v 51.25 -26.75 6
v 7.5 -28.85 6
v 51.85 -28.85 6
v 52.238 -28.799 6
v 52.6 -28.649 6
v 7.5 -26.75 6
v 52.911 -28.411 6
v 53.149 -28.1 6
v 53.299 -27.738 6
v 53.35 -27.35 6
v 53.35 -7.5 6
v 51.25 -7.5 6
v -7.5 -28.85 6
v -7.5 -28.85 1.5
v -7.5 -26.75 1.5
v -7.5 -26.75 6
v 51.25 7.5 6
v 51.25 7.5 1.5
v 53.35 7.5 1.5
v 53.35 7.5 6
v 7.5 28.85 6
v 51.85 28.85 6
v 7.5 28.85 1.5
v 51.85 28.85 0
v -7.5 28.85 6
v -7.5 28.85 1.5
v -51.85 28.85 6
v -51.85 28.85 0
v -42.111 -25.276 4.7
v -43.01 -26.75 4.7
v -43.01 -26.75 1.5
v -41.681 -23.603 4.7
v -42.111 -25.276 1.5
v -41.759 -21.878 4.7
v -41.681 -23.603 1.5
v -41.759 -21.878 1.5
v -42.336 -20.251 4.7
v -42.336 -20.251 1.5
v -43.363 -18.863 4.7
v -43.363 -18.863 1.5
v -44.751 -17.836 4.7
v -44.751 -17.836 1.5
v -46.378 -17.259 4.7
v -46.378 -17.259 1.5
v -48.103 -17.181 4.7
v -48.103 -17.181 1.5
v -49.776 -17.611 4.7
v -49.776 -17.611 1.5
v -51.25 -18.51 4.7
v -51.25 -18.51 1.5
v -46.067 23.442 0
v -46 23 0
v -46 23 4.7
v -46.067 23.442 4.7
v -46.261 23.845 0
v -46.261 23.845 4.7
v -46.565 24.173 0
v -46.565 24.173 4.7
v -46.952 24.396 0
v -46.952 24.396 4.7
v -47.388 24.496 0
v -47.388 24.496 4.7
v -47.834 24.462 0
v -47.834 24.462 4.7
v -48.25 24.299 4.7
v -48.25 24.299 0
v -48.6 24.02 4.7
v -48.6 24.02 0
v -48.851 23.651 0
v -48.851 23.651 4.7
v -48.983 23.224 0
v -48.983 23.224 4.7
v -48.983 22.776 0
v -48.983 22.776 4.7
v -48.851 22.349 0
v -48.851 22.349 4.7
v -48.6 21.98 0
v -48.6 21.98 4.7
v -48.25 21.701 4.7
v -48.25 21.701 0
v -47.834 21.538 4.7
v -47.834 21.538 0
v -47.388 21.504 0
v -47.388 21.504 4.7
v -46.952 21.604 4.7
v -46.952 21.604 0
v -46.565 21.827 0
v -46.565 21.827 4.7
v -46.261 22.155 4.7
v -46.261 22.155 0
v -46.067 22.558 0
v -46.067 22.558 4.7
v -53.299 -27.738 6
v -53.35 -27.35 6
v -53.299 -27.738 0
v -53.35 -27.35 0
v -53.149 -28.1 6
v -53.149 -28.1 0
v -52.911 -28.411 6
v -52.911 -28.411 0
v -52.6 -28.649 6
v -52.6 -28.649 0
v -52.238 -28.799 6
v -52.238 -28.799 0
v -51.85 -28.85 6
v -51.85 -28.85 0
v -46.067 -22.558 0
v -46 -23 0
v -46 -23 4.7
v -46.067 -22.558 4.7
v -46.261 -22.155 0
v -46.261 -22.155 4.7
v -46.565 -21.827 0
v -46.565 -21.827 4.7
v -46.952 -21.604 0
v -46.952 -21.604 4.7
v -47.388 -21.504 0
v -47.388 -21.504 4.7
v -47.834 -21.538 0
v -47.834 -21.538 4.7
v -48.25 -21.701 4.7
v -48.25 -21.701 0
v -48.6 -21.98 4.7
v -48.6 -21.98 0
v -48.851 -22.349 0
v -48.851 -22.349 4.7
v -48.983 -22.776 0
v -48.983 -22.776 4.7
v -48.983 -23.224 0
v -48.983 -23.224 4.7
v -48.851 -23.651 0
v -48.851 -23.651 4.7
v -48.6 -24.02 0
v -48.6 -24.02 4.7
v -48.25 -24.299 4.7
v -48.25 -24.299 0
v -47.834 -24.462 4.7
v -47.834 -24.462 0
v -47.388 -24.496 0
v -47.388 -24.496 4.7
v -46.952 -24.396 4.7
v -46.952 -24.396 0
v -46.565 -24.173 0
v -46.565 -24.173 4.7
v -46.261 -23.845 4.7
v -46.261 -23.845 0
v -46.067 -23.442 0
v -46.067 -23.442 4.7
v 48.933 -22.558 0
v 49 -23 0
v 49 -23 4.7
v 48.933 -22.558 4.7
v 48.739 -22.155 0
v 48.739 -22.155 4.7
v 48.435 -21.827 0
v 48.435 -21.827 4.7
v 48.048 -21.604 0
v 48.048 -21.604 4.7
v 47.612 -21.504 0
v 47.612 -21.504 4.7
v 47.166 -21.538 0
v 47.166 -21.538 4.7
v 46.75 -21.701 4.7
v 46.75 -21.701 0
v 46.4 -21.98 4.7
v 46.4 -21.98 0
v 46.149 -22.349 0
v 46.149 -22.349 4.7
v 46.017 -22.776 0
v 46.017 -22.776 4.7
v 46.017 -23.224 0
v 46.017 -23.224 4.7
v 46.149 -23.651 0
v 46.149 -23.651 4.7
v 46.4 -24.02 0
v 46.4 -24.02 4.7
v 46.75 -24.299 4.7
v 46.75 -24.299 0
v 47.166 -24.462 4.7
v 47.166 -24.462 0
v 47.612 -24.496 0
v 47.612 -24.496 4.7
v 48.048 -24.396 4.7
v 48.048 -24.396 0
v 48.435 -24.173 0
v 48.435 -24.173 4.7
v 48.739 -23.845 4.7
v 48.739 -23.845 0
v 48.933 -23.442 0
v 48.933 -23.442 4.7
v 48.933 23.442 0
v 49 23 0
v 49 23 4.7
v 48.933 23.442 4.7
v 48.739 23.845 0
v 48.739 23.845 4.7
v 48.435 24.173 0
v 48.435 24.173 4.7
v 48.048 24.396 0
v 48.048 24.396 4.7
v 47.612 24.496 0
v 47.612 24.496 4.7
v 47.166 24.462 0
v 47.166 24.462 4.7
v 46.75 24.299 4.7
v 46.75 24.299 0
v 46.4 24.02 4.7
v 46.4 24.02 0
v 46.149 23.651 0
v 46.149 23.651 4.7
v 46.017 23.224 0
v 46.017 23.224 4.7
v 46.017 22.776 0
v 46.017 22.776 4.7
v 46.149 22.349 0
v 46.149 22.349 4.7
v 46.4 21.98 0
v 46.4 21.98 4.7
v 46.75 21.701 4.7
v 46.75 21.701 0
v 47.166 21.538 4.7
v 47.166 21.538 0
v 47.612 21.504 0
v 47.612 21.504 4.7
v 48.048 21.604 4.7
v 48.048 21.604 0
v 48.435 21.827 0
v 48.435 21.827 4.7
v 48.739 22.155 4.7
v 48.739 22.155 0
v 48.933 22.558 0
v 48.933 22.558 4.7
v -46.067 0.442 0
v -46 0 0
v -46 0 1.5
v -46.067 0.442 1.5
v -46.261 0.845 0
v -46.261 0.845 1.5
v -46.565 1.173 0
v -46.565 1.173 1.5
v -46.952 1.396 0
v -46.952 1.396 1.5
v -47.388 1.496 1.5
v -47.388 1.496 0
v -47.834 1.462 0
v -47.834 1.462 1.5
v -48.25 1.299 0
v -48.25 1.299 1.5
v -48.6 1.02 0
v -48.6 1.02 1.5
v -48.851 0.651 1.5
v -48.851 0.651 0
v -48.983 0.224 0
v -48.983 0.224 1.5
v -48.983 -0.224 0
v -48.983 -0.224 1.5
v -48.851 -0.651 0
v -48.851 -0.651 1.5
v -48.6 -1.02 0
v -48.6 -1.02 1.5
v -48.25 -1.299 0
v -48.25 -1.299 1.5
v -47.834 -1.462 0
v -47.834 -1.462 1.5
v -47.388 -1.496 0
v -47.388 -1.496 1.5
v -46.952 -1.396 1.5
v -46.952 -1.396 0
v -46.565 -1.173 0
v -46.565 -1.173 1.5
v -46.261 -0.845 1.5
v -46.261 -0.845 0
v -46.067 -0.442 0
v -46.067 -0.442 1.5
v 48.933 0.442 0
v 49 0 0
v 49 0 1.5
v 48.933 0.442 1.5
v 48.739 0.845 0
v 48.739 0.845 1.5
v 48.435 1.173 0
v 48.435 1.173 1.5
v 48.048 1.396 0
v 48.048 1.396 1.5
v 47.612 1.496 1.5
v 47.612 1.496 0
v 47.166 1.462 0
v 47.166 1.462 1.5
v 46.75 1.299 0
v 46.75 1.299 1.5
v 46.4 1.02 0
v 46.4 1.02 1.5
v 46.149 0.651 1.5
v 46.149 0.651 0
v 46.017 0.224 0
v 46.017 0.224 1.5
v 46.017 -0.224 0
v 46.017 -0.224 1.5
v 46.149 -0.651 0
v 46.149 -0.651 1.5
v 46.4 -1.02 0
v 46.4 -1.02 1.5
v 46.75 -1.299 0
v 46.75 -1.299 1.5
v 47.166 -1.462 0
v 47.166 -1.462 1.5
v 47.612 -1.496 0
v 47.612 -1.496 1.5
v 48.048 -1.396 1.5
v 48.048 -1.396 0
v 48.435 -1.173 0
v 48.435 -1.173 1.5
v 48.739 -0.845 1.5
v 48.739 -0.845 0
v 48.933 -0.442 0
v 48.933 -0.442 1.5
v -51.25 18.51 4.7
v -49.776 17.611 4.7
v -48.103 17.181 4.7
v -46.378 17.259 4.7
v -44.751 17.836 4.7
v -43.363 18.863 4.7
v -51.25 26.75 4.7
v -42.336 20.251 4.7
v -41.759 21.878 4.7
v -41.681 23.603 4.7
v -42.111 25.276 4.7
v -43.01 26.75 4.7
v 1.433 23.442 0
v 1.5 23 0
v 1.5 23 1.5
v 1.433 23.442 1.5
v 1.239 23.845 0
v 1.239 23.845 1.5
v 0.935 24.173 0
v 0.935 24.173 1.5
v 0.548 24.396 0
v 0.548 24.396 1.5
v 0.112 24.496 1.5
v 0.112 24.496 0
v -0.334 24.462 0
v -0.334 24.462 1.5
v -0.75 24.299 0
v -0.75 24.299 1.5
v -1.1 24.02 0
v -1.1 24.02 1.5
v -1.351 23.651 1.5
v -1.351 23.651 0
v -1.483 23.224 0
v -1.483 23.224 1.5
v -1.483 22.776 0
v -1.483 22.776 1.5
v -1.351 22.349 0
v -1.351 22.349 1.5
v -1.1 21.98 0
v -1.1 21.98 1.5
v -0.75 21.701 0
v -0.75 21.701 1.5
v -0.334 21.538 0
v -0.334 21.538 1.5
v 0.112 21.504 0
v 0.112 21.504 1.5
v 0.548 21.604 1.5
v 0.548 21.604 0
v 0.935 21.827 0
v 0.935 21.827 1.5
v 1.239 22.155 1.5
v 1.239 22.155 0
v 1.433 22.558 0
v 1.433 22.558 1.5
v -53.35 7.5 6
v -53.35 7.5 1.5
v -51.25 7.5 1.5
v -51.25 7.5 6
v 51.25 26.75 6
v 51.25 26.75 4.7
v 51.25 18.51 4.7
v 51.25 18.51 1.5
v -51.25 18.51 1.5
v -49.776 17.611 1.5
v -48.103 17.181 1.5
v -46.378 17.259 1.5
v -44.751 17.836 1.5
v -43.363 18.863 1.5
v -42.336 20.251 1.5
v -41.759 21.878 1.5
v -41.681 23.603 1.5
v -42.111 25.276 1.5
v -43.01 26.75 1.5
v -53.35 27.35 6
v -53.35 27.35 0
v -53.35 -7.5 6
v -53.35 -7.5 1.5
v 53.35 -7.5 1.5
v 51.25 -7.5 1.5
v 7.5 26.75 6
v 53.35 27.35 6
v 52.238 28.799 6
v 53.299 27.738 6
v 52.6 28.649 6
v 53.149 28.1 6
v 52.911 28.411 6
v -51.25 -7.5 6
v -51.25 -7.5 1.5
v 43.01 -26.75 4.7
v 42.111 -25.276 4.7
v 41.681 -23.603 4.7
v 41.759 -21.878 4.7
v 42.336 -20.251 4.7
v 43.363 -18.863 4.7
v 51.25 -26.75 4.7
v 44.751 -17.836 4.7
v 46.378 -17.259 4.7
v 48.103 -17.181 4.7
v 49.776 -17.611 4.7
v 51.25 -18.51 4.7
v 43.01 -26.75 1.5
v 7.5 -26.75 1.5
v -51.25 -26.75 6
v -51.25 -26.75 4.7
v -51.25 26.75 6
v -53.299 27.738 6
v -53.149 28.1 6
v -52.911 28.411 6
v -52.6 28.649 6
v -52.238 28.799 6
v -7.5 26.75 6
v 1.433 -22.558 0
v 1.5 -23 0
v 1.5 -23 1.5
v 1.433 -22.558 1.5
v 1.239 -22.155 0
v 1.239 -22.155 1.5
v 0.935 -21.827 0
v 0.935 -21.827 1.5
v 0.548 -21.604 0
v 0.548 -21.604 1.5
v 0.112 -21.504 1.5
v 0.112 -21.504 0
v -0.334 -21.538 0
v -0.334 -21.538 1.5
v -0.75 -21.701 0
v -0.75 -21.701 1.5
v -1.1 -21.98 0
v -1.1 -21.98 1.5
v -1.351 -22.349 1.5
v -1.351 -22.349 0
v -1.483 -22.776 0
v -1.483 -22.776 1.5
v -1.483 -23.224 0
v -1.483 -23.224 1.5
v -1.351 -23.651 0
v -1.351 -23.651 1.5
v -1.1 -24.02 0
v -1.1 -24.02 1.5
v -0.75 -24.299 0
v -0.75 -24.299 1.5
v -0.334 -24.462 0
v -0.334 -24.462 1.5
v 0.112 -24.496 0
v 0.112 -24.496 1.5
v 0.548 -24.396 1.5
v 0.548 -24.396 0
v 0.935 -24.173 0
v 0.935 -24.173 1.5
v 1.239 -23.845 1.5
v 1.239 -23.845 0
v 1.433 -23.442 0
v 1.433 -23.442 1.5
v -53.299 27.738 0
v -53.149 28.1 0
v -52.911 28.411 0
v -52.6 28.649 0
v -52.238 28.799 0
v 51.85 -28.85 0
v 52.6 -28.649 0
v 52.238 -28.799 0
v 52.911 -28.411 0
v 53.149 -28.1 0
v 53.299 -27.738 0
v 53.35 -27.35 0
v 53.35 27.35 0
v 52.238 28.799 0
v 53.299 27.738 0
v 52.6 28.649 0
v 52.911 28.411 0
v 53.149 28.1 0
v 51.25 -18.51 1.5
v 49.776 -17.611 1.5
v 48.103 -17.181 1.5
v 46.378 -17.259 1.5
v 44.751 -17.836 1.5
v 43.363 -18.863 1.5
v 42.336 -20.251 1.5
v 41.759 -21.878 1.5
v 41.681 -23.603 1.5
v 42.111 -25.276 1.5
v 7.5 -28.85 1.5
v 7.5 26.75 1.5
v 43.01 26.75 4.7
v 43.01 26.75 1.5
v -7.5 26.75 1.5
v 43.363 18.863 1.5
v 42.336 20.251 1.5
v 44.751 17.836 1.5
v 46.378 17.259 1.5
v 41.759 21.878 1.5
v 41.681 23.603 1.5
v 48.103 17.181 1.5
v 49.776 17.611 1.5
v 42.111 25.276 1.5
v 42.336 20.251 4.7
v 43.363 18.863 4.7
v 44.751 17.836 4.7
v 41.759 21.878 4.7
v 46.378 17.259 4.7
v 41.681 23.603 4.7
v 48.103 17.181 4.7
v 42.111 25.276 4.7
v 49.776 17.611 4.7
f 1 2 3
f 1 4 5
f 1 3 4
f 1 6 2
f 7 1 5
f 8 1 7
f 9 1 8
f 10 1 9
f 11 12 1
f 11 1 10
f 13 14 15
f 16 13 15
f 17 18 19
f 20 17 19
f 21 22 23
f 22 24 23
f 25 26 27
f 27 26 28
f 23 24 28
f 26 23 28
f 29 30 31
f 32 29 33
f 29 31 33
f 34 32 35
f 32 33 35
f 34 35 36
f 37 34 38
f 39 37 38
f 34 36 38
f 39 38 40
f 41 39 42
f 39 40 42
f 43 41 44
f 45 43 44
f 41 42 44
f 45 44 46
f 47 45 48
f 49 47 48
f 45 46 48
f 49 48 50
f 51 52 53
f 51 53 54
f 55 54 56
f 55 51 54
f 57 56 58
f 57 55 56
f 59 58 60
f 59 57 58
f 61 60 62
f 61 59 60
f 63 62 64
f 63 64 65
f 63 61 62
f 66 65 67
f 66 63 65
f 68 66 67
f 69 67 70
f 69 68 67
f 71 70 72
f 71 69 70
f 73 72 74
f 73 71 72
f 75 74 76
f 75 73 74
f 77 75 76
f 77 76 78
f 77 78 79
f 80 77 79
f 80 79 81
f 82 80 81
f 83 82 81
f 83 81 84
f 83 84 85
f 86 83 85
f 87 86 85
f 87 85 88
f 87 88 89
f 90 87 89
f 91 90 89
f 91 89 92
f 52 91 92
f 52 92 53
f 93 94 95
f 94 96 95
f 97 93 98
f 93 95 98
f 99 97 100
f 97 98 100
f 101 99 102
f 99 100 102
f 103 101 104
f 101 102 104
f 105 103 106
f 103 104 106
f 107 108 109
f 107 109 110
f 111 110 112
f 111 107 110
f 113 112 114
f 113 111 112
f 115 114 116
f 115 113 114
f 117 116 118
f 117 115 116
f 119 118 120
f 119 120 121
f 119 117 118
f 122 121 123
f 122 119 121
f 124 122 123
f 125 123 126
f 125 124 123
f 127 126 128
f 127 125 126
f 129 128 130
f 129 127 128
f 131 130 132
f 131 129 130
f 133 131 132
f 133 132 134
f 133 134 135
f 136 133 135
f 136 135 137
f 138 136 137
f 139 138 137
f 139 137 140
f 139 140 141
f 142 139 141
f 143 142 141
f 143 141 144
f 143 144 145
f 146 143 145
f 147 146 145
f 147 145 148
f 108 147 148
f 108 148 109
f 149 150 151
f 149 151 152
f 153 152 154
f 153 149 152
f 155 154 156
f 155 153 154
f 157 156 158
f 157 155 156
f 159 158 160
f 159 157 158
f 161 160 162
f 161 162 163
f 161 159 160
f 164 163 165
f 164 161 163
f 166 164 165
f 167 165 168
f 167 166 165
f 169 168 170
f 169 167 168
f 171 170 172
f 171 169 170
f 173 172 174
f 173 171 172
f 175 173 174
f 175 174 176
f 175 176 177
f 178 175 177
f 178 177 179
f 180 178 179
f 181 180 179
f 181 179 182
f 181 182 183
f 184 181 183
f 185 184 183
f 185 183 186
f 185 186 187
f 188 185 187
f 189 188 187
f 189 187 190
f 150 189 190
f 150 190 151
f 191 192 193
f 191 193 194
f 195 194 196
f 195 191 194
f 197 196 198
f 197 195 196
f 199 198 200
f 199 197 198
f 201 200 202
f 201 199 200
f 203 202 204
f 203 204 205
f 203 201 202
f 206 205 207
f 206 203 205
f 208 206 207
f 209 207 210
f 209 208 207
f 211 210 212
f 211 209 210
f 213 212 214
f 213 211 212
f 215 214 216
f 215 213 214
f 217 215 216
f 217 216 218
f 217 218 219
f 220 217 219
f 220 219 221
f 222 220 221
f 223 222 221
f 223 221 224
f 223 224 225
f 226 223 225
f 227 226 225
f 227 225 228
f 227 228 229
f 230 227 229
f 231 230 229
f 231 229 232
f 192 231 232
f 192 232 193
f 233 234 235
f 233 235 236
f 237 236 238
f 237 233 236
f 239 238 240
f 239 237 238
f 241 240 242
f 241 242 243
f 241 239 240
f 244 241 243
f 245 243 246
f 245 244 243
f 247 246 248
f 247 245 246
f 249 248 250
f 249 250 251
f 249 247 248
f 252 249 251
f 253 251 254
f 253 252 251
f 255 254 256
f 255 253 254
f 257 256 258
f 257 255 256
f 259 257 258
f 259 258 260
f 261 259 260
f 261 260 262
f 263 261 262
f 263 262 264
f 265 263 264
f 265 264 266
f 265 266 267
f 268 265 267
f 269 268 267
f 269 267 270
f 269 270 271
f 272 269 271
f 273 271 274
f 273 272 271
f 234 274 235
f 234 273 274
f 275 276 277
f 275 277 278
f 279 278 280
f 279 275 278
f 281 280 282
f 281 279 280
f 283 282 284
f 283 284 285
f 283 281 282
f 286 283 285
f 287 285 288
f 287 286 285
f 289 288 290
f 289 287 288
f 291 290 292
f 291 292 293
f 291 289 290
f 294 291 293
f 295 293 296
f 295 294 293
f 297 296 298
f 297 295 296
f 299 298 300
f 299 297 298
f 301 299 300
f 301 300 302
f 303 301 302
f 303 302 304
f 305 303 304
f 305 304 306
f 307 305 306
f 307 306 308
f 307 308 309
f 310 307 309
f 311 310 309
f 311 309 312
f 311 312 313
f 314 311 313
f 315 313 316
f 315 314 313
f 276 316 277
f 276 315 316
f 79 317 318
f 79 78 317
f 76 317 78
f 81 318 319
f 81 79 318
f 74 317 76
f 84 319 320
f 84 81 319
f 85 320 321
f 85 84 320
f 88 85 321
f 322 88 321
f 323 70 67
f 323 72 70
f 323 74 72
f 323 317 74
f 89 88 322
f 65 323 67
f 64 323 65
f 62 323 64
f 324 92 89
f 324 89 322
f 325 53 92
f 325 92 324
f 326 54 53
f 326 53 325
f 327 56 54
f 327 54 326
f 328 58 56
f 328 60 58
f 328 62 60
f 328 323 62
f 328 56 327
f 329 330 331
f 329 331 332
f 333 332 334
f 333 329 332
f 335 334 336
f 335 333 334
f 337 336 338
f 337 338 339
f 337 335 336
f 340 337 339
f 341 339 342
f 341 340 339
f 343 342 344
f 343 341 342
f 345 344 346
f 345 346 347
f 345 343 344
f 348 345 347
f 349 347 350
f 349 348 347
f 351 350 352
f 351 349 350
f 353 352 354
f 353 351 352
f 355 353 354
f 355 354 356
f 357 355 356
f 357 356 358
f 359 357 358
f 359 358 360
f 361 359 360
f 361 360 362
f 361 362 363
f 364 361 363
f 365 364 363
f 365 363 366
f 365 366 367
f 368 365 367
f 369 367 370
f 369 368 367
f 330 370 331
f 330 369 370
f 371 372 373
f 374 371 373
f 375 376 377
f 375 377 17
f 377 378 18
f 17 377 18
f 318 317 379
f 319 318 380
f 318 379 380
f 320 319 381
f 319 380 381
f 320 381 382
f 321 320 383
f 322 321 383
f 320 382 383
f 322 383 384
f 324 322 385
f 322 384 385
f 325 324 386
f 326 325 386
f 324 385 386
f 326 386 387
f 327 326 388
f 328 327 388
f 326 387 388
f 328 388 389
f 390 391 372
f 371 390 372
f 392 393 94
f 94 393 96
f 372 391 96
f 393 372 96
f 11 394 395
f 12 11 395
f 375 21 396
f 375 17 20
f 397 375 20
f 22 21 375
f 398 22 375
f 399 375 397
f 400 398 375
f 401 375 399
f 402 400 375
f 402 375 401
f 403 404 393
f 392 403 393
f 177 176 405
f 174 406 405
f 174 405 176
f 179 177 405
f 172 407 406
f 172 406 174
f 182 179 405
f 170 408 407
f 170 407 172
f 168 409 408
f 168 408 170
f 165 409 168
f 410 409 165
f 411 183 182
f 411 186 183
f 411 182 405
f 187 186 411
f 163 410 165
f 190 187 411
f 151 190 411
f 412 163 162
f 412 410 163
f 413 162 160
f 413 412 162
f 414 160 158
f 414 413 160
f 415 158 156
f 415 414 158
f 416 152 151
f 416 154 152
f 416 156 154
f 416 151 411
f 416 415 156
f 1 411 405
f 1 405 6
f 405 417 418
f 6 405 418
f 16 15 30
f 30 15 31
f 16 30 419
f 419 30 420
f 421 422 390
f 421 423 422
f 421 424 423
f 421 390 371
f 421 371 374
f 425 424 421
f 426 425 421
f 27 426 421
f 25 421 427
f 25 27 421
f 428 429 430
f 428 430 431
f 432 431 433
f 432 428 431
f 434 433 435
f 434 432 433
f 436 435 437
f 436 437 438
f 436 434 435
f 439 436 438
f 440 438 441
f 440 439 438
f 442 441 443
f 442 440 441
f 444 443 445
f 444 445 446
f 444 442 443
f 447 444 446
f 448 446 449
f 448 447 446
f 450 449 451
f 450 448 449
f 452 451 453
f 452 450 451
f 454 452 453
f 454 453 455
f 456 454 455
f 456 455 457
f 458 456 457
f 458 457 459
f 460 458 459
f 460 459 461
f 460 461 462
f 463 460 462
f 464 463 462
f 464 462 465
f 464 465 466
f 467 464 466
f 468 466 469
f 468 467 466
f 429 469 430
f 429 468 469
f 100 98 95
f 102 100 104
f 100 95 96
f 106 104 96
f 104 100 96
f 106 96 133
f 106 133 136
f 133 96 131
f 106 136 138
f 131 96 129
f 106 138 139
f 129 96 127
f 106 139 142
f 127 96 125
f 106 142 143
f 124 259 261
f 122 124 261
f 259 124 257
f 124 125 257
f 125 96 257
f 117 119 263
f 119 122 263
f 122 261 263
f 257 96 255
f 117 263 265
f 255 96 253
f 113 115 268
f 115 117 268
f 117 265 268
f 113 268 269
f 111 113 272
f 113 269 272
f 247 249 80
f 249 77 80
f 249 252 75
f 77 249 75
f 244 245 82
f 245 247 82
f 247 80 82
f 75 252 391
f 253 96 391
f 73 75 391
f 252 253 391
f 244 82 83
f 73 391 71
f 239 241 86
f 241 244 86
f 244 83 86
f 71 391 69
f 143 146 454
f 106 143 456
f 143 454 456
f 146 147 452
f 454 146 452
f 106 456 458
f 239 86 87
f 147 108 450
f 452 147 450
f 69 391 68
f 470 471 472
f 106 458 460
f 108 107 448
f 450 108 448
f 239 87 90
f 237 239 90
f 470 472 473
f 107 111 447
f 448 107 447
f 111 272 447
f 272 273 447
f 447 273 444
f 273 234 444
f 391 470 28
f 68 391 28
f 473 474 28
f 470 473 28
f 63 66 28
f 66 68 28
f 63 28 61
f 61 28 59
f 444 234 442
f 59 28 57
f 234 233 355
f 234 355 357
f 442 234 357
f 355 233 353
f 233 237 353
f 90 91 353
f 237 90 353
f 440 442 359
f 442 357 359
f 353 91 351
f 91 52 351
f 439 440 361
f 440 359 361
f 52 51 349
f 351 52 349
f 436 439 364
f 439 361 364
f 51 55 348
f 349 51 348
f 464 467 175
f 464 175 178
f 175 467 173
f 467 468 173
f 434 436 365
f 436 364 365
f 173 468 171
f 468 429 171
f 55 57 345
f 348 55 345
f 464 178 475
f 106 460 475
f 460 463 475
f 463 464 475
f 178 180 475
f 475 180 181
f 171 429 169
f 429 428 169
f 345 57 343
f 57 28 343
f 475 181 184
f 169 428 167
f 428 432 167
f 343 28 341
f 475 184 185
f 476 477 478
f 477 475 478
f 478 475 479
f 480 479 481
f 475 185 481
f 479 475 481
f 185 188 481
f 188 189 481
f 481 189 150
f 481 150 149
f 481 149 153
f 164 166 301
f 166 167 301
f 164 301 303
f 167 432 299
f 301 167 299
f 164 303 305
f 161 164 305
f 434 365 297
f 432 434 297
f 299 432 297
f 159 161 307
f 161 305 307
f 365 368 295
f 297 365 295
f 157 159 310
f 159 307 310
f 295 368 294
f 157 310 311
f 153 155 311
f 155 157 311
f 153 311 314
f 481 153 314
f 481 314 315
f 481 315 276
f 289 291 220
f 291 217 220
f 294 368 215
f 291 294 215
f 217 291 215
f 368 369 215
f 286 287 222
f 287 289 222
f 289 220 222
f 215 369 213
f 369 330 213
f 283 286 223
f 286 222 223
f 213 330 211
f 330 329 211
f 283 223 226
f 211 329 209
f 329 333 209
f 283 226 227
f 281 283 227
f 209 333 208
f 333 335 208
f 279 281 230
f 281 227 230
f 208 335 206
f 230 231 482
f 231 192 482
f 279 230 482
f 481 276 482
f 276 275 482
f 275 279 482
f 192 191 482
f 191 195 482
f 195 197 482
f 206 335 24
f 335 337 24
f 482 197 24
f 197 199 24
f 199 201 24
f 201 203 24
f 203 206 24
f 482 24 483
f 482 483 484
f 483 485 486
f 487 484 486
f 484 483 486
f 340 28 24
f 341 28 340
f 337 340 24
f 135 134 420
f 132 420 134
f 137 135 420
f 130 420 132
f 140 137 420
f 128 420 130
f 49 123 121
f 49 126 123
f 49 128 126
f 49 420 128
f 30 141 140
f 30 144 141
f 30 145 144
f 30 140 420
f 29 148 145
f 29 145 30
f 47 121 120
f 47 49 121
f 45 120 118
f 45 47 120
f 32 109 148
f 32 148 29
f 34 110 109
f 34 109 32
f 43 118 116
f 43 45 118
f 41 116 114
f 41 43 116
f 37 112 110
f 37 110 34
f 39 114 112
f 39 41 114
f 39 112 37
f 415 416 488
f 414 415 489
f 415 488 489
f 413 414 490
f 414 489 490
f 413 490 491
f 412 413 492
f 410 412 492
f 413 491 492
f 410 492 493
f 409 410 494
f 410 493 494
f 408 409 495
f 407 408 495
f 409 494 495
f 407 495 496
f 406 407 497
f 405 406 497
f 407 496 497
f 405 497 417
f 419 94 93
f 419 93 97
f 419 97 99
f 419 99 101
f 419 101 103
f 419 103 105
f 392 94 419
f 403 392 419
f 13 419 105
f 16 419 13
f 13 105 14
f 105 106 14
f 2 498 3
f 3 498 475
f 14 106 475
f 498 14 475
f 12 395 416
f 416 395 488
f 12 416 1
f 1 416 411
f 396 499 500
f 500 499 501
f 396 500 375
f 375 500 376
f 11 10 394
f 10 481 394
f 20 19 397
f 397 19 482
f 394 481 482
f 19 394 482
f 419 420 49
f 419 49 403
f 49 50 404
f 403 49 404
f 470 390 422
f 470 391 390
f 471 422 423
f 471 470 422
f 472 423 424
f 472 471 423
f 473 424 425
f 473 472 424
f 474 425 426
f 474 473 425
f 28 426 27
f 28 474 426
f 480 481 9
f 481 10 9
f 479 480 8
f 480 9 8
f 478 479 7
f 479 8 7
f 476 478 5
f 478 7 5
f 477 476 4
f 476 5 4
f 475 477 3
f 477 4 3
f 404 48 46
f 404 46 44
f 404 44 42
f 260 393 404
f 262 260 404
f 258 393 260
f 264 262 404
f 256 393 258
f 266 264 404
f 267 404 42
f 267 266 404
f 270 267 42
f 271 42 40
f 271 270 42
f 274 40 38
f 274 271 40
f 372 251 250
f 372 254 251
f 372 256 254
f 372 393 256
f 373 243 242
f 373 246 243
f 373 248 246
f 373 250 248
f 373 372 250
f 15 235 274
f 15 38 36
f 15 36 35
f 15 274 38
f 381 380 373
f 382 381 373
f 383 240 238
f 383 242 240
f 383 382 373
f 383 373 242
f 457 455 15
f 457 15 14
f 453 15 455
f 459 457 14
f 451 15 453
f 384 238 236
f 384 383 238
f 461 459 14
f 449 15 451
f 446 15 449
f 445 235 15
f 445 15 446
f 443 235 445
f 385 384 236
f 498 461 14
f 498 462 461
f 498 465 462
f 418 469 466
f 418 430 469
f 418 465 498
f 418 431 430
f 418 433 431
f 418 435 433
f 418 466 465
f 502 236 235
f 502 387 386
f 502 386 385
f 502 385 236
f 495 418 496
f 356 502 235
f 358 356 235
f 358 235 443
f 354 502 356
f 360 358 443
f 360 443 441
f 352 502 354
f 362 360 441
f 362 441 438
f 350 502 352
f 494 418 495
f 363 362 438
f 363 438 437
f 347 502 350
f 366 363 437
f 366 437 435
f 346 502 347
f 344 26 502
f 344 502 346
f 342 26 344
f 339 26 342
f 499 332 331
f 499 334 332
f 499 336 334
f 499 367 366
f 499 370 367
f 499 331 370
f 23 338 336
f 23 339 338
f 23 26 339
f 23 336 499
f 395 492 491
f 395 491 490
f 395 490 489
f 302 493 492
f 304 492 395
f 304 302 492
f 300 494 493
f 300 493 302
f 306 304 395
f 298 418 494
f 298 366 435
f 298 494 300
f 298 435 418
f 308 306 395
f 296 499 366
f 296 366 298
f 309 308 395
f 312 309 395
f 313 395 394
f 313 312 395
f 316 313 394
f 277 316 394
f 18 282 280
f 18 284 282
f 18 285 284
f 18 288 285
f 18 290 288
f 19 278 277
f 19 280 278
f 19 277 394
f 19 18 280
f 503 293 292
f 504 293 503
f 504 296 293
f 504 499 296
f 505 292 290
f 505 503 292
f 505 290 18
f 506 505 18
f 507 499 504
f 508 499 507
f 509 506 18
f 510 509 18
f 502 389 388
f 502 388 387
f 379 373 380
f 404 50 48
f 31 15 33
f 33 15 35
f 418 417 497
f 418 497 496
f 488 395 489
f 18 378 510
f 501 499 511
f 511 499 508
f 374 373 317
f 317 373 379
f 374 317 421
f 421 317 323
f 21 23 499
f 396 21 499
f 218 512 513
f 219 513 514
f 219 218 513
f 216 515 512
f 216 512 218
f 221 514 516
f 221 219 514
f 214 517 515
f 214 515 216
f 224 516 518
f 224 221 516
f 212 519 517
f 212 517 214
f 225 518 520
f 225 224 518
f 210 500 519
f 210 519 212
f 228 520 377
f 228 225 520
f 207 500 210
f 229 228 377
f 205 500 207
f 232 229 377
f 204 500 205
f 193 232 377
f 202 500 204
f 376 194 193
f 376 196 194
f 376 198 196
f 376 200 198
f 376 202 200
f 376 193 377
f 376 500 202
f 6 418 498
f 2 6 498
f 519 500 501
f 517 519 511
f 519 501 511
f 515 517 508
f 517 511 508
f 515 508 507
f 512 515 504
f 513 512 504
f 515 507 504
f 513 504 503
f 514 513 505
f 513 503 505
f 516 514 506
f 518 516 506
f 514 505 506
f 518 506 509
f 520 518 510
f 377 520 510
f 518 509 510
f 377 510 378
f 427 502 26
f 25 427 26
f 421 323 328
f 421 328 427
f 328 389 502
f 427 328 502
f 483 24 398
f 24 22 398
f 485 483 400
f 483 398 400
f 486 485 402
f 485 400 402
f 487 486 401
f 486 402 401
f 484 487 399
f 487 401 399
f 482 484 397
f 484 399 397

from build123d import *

# Parameters (mm, degrees)
F2_W     = 2.1
F2_H     = 15
F2_W_2   = 15
F2_H_2   = 2.1
F2_R     = 1.5
F2_W_3   = 43.75
F2_H_3   = 19.25
F3_DEPTH = 1.5
F4_DEPTH = 4.7
F5_DEPTH = 6
F6_R     = 1.5


with BuildPart() as f3:
    # F2 (on Top) → F3 (new body)
    with BuildSketch(Plane.XY):
        Polygon((-51.25, 18.5100111359), (-51.25, 26.75), (-43.0100111359, 26.75), (-7.5, 26.75), (-7.5, 28.85), (-53.35, 28.85), (-53.35, 7.5), (-51.25, 7.5), align=None)
        with Locations((-52.3, 0)):
            Rectangle(F2_W, F2_H)
        with Locations((52.3, 0)):
            Rectangle(F2_W, F2_H)
        Polygon((7.5, 28.85), (7.5, 26.75), (43.0100111359, 26.75), (51.25, 26.75), (51.25, 18.5100111359), (51.25, 7.5), (53.35, 7.5), (53.35, 28.85), align=None)
        Polygon((-51.25, -18.5100111359), (-51.25, -7.5), (-53.35, -7.5), (-53.35, -28.85), (-7.5, -28.85), (-7.5, -26.75), (-43.0100111359, -26.75), (-51.25, -26.75), align=None)
        with Locations((0, -27.8)):
            Rectangle(F2_W_2, F2_H_2)
        with Locations((0, 27.8)):
            Rectangle(F2_W_2, F2_H_2)
        Polygon((53.35, -7.5), (51.25, -7.5), (51.25, -18.5100111359), (51.25, -26.75), (43.0100111359, -26.75), (7.5, -26.75), (7.5, -28.85), (53.35, -28.85), align=None)
        with BuildLine():
            Line((-7.5, -7.5), (-51.25, -7.5))
            Line((-51.25, -7.5), (-51.25, -18.5100111359))
            ThreePointArc((-51.25, -18.5100111359), (-43.3634253301, -18.8634253301), (-43.0100111359, -26.75))
            Line((-43.0100111359, -26.75), (-7.5, -26.75))
            Line((-7.5, -26.75), (-7.5, -7.5))
        make_face()
        with BuildLine():
            Line((-43.0100111359, 26.75), (-51.25, 26.75))
            Line((-51.25, 26.75), (-51.25, 18.5100111359))
            ThreePointArc((-51.25, 18.5100111359), (-43.3634253301, 18.8634253301), (-43.0100111359, 26.75))
        make_face()
        with Locations((-47.5, 23)):
            Circle(F2_R, mode=Mode.SUBTRACT)
        with BuildLine():
            Line((51.25, 26.75), (43.0100111359, 26.75))
            ThreePointArc((43.0100111359, 26.75), (43.3634253301, 18.8634253301), (51.25, 18.5100111359))
            Line((51.25, 18.5100111359), (51.25, 26.75))
        make_face()
        with Locations((47.5, 23)):
            Circle(F2_R, mode=Mode.SUBTRACT)
        with BuildLine():
            Line((51.25, -26.75), (51.25, -18.5100111359))
            ThreePointArc((51.25, -18.5100111359), (43.3634253301, -18.8634253301), (43.0100111359, -26.75))
            Line((43.0100111359, -26.75), (51.25, -26.75))
        make_face()
        with Locations((47.5, -23)):
            Circle(F2_R, mode=Mode.SUBTRACT)
        with BuildLine():
            ThreePointArc((-43.0100111359, -26.75), (-43.3634253301, -18.8634253301), (-51.25, -18.5100111359))
            Line((-51.25, -18.5100111359), (-51.25, -26.75))
            Line((-51.25, -26.75), (-43.0100111359, -26.75))
        make_face()
        with Locations((-47.5, -23)):
            Circle(F2_R, mode=Mode.SUBTRACT)
        with Locations((-29.375, 0)):
            Rectangle(F2_W_3, F2_H)
        with Locations((-47.5, 0)):
            Circle(F2_R, mode=Mode.SUBTRACT)
        with BuildLine():
            Line((-7.5, 26.75), (-43.0100111359, 26.75))
            ThreePointArc((-43.0100111359, 26.75), (-43.3634253301, 18.8634253301), (-51.25, 18.5100111359))
            Line((-51.25, 18.5100111359), (-51.25, 7.5))
            Line((-51.25, 7.5), (-7.5, 7.5))
            Line((-7.5, 7.5), (-7.5, 26.75))
        make_face()
        with Locations((0, 17.125)):
            Rectangle(F2_W_2, F2_H_3)
        with Locations((0, 23)):
            Circle(F2_R, mode=Mode.SUBTRACT)
        with BuildLine():
            Line((43.0100111359, 26.75), (7.5, 26.75))
            Line((7.5, 26.75), (7.5, 7.5))
            Line((7.5, 7.5), (51.25, 7.5))
            Line((51.25, 7.5), (51.25, 18.5100111359))
            ThreePointArc((51.25, 18.5100111359), (43.3634253301, 18.8634253301), (43.0100111359, 26.75))
        make_face()
        with Locations((29.375, 0)):
            Rectangle(F2_W_3, F2_H)
        with Locations((47.5, 0)):
            Circle(F2_R, mode=Mode.SUBTRACT)
        with BuildLine():
            Line((51.25, -7.5), (7.5, -7.5))
            Line((7.5, -7.5), (7.5, -26.75))
            Line((7.5, -26.75), (43.0100111359, -26.75))
            ThreePointArc((43.0100111359, -26.75), (43.3634253301, -18.8634253301), (51.25, -18.5100111359))
            Line((51.25, -18.5100111359), (51.25, -7.5))
        make_face()
        with Locations((0, -17.125)):
            Rectangle(F2_W_2, F2_H_3)
        with Locations((0, -23)):
            Circle(F2_R, mode=Mode.SUBTRACT)
        Rectangle(F2_W_2, F2_H)
    extrude(amount=F3_DEPTH)

    # F2 (on Top) → F4 (join)
    with BuildSketch(Plane.XY):
        with BuildLine():
            ThreePointArc((-43.0100111359, -26.75), (-43.3634253301, -18.8634253301), (-51.25, -18.5100111359))
            Line((-51.25, -18.5100111359), (-51.25, -26.75))
            Line((-51.25, -26.75), (-43.0100111359, -26.75))
        make_face()
        with Locations((-47.5, -23)):
            Circle(F2_R, mode=Mode.SUBTRACT)
        with BuildLine():
            Line((51.25, -26.75), (51.25, -18.5100111359))
            ThreePointArc((51.25, -18.5100111359), (43.3634253301, -18.8634253301), (43.0100111359, -26.75))
            Line((43.0100111359, -26.75), (51.25, -26.75))
        make_face()
        with Locations((47.5, -23)):
            Circle(F2_R, mode=Mode.SUBTRACT)
        with BuildLine():
            Line((51.25, 26.75), (43.0100111359, 26.75))
            ThreePointArc((43.0100111359, 26.75), (43.3634253301, 18.8634253301), (51.25, 18.5100111359))
            Line((51.25, 18.5100111359), (51.25, 26.75))
        make_face()
        with Locations((47.5, 23)):
            Circle(F2_R, mode=Mode.SUBTRACT)
        with BuildLine():
            Line((-43.0100111359, 26.75), (-51.25, 26.75))
            Line((-51.25, 26.75), (-51.25, 18.5100111359))
            ThreePointArc((-51.25, 18.5100111359), (-43.3634253301, 18.8634253301), (-43.0100111359, 26.75))
        make_face()
        with Locations((-47.5, 23)):
            Circle(F2_R, mode=Mode.SUBTRACT)
    extrude(amount=F4_DEPTH)

    # F2 (on Top) → F5 (join)
    with BuildSketch(Plane.XY):
        Polygon((-51.25, -18.5100111359), (-51.25, -7.5), (-53.35, -7.5), (-53.35, -28.85), (-7.5, -28.85), (-7.5, -26.75), (-43.0100111359, -26.75), (-51.25, -26.75), align=None)
        Polygon((53.35, -7.5), (51.25, -7.5), (51.25, -18.5100111359), (51.25, -26.75), (43.0100111359, -26.75), (7.5, -26.75), (7.5, -28.85), (53.35, -28.85), align=None)
        Polygon((-51.25, 18.5100111359), (-51.25, 26.75), (-43.0100111359, 26.75), (-7.5, 26.75), (-7.5, 28.85), (-53.35, 28.85), (-53.35, 7.5), (-51.25, 7.5), align=None)
        Polygon((7.5, 28.85), (7.5, 26.75), (43.0100111359, 26.75), (51.25, 26.75), (51.25, 18.5100111359), (51.25, 7.5), (53.35, 7.5), (53.35, 28.85), align=None)
    extrude(amount=F5_DEPTH)

    # F6
    f6_edges = [f3.edges().sort_by_distance(p)[0] for p in [
        (53.35, -28.85, 3),
        (53.35, 28.85, 3),
        (-53.35, 28.85, 3),
        (-53.35, -28.85, 3),
    ]]
    fillet(f6_edges, radius=F6_R)


solid = f3.part
